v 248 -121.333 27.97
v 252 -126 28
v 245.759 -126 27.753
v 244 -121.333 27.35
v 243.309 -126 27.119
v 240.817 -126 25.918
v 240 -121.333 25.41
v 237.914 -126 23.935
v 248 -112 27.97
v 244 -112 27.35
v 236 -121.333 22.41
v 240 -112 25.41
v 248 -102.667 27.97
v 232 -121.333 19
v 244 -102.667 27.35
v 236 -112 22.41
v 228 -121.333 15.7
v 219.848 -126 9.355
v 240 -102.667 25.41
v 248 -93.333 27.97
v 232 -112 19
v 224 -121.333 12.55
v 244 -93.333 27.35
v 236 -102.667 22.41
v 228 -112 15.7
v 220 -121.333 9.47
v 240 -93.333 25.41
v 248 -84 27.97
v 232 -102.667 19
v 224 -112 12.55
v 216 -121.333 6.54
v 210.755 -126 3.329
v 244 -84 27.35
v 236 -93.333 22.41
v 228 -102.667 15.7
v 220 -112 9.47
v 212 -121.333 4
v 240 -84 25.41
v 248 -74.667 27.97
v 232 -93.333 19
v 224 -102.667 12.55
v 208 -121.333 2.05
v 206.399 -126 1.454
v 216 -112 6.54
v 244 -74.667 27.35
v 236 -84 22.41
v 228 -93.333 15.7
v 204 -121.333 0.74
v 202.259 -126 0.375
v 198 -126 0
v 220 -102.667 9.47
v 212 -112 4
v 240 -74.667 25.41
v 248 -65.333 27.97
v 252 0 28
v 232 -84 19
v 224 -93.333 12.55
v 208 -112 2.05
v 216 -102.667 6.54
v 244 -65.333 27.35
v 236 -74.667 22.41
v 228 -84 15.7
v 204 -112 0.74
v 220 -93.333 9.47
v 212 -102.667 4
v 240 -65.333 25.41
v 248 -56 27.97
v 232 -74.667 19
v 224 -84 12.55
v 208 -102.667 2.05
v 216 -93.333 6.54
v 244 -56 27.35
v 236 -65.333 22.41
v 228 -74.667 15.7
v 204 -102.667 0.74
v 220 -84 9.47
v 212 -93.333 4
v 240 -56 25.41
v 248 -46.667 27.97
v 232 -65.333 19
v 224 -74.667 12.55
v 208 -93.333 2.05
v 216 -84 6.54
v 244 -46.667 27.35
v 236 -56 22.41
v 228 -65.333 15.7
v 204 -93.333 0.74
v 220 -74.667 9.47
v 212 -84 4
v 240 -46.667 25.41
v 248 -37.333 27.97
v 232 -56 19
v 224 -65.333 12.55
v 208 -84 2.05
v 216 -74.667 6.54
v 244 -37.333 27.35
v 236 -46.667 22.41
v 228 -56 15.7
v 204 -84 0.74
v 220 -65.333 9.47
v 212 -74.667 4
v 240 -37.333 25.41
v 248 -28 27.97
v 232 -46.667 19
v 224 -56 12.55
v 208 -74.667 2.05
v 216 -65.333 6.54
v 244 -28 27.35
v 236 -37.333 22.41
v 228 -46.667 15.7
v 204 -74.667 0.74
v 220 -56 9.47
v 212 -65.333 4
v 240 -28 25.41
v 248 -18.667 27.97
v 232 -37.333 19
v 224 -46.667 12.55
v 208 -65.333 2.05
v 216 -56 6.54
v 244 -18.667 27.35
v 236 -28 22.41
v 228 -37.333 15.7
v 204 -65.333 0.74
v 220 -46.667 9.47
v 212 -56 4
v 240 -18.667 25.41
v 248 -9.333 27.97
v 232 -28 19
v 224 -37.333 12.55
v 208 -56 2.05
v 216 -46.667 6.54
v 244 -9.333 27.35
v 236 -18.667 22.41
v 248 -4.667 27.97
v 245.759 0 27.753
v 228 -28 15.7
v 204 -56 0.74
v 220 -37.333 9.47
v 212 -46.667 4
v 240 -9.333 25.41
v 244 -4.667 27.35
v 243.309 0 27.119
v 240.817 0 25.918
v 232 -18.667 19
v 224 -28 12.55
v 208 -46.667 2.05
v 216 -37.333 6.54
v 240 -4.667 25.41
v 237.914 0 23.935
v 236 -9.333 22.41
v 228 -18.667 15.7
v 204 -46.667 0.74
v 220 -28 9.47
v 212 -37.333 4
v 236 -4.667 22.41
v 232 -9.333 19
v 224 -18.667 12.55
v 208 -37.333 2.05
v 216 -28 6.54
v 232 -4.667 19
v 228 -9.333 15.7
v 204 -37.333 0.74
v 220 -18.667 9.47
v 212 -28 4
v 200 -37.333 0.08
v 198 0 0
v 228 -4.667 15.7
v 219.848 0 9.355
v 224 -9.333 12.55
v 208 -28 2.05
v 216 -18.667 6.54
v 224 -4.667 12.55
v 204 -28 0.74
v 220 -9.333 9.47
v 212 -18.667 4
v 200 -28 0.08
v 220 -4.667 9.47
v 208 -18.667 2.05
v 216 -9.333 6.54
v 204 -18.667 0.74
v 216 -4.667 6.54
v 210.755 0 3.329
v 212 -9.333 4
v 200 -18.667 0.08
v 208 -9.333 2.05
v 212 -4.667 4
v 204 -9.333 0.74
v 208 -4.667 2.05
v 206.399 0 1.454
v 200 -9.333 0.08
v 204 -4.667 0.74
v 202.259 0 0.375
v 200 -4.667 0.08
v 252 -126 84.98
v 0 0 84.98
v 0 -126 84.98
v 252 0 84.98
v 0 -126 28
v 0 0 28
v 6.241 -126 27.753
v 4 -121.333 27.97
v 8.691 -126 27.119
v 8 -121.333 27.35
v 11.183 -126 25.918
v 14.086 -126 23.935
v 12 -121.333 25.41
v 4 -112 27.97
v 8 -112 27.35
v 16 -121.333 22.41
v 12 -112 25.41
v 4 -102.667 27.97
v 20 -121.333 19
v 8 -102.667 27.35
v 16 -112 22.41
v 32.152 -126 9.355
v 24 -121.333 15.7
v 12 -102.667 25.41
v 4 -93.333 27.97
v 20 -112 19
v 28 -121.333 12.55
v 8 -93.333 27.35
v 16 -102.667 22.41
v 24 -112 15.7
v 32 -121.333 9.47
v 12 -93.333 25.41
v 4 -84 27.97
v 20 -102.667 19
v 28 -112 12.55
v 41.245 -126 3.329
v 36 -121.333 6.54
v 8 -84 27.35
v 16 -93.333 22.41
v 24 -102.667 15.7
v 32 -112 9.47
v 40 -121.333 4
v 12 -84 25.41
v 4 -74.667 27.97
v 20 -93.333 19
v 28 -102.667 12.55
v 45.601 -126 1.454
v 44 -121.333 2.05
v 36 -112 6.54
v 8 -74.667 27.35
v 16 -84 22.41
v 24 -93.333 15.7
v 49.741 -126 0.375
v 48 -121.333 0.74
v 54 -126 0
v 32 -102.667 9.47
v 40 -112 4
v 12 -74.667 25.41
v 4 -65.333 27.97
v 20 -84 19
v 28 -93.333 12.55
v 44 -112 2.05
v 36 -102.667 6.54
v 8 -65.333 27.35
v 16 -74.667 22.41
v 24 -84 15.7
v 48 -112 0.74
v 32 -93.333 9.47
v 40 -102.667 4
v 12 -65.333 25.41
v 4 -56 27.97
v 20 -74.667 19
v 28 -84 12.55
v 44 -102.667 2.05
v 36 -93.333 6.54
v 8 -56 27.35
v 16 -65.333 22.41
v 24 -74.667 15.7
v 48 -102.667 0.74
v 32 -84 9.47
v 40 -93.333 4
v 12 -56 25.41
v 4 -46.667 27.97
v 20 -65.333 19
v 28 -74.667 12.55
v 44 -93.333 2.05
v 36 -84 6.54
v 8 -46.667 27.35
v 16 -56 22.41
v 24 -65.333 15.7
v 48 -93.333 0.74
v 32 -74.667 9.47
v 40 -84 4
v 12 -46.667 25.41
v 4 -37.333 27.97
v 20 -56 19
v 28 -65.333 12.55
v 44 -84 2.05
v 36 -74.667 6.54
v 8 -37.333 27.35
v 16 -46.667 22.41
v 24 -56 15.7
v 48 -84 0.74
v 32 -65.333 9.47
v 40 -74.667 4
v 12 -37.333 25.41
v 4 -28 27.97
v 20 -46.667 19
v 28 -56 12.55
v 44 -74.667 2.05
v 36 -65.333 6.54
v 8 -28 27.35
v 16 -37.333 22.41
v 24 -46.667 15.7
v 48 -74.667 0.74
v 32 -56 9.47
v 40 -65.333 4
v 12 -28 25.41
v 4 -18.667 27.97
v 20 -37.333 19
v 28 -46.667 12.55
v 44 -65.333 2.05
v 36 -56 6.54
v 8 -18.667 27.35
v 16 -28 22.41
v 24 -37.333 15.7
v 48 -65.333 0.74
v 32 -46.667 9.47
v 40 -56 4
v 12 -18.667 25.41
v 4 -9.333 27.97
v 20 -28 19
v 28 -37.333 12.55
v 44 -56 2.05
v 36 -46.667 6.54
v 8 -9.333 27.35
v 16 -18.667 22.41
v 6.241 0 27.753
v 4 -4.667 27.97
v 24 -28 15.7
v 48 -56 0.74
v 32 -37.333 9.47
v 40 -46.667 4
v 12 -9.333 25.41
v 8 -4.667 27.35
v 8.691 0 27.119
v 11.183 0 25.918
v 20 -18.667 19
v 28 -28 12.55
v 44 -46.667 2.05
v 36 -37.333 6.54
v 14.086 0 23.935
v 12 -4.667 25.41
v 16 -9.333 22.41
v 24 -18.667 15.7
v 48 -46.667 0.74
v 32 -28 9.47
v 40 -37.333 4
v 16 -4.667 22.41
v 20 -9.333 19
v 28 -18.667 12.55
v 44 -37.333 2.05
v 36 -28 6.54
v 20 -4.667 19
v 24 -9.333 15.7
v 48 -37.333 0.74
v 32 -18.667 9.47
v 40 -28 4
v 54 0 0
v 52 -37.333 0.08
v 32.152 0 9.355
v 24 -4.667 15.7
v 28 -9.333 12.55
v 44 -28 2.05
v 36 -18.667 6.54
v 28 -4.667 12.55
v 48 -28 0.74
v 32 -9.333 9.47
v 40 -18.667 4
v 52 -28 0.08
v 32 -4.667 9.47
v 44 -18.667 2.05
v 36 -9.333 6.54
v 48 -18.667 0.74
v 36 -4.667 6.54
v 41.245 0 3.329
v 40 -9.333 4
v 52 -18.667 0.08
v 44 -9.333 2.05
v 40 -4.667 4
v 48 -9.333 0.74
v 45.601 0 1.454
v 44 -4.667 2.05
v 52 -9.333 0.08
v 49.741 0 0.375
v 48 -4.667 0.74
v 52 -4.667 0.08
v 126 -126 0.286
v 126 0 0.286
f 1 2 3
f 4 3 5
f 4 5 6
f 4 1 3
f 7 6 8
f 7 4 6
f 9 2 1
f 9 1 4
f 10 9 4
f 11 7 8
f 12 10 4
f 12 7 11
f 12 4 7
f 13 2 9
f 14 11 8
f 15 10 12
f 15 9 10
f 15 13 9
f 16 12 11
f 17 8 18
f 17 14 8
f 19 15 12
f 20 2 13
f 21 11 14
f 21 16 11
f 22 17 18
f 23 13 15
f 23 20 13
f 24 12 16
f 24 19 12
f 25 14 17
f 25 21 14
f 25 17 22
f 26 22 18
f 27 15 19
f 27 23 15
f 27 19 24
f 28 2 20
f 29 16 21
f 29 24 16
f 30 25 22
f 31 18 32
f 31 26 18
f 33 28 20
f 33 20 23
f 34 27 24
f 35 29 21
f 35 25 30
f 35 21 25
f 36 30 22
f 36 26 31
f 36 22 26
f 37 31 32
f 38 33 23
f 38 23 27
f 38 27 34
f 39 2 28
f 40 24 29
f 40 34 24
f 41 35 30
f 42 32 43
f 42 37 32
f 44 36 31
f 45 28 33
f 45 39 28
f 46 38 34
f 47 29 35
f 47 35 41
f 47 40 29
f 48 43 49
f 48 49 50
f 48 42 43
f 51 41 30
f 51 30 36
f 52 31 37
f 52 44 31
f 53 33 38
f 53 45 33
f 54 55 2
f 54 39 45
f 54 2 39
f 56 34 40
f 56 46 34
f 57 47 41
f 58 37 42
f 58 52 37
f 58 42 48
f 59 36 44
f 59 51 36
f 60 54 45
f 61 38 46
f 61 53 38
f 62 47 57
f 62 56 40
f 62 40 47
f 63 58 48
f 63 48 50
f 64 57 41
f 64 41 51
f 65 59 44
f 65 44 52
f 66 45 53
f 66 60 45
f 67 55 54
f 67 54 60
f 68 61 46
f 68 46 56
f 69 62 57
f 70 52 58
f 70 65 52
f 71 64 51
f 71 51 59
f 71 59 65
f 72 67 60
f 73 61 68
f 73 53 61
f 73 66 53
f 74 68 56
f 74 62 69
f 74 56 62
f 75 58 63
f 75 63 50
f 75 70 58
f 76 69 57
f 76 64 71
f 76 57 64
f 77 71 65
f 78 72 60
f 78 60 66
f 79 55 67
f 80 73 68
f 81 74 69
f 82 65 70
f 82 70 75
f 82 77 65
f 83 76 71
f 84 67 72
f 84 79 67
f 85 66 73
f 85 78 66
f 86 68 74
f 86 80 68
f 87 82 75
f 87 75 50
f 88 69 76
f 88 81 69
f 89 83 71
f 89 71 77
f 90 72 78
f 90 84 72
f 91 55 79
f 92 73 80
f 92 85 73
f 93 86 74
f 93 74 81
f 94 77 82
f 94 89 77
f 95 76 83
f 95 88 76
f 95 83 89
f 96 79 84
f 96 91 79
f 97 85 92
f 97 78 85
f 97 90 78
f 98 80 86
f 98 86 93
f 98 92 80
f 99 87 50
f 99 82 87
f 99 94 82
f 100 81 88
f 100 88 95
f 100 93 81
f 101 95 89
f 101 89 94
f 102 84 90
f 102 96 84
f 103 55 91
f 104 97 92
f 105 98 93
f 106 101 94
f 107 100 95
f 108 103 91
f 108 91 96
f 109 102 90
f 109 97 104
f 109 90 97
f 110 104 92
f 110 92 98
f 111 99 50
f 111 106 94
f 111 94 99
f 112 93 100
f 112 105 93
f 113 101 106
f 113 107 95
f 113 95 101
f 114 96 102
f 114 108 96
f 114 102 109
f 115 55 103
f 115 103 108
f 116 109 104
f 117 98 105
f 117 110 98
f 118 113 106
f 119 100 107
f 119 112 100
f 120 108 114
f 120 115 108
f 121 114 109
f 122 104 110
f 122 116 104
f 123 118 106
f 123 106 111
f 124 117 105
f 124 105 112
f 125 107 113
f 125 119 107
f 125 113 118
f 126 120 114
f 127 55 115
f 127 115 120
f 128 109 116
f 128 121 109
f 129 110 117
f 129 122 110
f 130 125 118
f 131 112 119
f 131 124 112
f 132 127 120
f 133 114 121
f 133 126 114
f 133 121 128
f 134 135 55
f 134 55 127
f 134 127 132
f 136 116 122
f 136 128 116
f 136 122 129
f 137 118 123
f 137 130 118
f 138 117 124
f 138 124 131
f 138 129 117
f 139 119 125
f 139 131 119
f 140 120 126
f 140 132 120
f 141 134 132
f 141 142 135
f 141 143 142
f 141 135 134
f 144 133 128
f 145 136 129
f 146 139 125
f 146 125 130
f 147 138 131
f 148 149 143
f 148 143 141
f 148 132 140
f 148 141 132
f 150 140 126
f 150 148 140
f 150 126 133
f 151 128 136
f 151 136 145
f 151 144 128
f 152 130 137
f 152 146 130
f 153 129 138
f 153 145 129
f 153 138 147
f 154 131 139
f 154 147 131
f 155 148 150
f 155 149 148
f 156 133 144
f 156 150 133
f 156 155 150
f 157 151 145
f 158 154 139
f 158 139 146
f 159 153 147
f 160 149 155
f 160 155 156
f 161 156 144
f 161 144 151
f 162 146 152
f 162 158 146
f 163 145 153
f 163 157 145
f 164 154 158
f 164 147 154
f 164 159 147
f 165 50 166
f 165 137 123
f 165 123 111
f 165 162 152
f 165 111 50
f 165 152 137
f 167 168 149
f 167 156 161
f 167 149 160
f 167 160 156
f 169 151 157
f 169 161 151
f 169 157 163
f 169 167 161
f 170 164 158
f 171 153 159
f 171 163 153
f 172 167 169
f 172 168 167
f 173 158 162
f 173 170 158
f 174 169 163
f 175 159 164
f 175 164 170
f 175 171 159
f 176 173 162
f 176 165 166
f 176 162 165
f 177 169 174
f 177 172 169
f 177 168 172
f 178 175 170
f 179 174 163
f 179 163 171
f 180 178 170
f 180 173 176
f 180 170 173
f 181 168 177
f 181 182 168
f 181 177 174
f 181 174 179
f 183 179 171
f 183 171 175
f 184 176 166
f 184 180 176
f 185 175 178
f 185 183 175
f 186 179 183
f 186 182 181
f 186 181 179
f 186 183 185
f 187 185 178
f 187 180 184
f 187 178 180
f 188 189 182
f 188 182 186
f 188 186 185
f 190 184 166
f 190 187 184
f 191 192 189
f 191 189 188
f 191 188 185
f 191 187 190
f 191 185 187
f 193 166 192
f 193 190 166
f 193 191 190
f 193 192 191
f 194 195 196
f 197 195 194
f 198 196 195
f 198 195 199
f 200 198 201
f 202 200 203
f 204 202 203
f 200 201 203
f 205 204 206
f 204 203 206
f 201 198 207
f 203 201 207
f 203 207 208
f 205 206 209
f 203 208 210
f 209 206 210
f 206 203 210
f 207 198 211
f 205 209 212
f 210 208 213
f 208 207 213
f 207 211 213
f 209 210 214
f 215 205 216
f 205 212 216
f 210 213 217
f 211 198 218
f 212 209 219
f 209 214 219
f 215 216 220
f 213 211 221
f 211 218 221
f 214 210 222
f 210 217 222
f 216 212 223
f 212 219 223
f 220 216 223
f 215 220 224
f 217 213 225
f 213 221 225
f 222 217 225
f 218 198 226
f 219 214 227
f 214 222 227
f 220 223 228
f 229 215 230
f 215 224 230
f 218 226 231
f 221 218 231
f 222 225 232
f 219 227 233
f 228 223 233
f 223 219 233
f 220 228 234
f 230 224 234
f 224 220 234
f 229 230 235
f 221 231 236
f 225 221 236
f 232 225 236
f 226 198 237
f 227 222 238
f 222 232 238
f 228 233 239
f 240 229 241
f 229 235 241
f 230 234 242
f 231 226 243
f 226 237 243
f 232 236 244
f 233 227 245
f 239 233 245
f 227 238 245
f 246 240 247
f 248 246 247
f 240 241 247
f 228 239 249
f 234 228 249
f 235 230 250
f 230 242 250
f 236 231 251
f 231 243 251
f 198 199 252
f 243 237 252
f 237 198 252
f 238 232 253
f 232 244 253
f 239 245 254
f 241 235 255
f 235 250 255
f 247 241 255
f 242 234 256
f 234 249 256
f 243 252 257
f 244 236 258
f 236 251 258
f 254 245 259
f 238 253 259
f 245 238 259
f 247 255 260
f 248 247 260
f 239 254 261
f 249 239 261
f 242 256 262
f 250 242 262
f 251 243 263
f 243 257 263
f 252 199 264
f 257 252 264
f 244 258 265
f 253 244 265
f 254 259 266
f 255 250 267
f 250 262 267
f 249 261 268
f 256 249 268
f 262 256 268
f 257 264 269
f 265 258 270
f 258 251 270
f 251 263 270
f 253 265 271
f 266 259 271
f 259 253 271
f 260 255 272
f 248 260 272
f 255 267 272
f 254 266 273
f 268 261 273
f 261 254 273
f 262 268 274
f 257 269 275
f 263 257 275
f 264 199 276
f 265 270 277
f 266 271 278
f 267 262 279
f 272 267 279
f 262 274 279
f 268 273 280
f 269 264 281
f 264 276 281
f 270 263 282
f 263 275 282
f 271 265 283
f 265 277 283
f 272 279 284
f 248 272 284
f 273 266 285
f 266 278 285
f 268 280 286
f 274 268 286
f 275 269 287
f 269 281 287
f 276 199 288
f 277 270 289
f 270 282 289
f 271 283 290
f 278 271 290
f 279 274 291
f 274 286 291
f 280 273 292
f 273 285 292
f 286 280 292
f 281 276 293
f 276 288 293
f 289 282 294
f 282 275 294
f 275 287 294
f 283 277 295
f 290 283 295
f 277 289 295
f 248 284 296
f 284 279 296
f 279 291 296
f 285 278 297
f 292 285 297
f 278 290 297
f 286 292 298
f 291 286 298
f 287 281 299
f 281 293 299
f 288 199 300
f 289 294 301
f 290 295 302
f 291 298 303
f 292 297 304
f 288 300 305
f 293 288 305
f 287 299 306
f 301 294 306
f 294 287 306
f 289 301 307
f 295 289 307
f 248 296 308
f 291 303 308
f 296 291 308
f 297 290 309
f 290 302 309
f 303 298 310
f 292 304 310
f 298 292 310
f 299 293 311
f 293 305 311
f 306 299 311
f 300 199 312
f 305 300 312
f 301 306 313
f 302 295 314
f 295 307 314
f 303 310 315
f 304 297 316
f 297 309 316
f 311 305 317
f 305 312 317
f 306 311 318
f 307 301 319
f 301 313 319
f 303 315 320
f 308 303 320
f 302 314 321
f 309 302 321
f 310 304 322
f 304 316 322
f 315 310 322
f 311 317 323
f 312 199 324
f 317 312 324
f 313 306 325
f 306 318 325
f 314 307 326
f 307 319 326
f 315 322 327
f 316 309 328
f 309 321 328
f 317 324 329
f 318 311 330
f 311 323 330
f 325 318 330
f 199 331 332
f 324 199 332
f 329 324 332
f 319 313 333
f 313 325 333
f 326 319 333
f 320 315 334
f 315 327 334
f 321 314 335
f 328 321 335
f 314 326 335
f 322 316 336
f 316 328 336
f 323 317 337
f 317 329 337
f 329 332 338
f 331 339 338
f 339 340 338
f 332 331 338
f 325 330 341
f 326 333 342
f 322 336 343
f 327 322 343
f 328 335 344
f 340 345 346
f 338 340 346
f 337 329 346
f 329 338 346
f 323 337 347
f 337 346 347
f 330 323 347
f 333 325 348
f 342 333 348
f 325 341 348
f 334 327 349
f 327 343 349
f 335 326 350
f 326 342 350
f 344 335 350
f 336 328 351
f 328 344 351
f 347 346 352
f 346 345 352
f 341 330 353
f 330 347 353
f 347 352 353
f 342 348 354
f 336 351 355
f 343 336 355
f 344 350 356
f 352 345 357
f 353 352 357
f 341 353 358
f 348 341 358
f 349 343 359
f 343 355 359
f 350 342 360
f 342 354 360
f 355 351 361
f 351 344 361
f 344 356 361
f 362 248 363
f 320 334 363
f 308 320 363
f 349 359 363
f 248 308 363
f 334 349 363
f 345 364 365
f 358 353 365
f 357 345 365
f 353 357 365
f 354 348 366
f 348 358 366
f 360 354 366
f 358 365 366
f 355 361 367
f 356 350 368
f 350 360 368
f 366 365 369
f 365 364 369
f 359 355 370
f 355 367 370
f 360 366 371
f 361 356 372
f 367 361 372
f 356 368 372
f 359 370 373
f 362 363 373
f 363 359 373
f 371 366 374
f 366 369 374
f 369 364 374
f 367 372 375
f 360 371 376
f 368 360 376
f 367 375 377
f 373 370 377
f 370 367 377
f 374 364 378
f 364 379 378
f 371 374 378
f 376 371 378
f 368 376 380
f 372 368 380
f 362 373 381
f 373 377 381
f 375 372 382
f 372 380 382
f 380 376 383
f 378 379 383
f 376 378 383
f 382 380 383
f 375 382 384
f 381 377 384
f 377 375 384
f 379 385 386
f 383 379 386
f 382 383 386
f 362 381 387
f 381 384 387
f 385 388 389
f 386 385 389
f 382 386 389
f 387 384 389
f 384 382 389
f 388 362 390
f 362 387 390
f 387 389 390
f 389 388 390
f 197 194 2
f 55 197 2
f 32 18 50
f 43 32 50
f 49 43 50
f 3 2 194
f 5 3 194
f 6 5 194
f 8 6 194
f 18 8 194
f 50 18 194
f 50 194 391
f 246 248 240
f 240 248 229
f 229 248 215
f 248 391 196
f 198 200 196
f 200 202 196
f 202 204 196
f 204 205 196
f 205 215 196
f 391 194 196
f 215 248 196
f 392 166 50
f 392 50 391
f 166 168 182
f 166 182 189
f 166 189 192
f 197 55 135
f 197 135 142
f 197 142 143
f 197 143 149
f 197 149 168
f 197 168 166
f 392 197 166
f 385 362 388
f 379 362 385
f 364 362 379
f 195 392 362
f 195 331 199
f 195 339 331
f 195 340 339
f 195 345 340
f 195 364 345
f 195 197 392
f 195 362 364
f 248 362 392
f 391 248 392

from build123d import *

# Parameters (mm, degrees)
F1_DEPTH = 126


with BuildPart() as f1:
    # F0 (on Front) → F1 (new body)
    with BuildSketch(Plane.XZ):
        with BuildLine():
            Line((0, 84.98), (0, 28))
            add(Edge.make_bspline(
                [(0, 28), (0.618794, 28.000273), (2.022182, 28.000889), (3.997252, 27.996472), (6.020393, 27.83137), (8.049271, 27.39716), (10.073322, 26.588185), (12.058052, 25.412291), (14.042848, 23.996858), (16.027734, 22.406702), (18.001384, 20.708277), (19.989334, 19.000738), (21.990425, 17.331716), (23.990056, 15.700986), (25.99234, 14.110248), (27.99837, 12.551237), (29.994775, 10.999885), (31.99357, 9.471529), (33.983048, 7.970339), (35.976312, 6.539007), (37.973681, 5.208922), (39.964333, 3.990272), (41.971527, 2.941765), (43.969055, 2.030999), (45.979124, 1.30507), (47.97783, 0.713784), (49.993541, 0.308832), (51.97042, 0.044173), (53.38056, 0.013435), (54, 0)],
                knots=[0, 0, 0, 0, 2, 4.000225, 6.008309, 8.056137, 10.206509, 12.513563, 14.960623, 17.515637, 20.140518, 22.771887, 25.377439, 27.957535, 30.51255, 33.049004, 35.579321, 38.097435, 40.597435, 43.056073, 45.457926, 47.795468, 50.054339, 52.24751, 54.376571, 56.458974, 58.500566, 60.51613, 62.51773, 62.51773, 62.51773, 62.51773], degree=3))
            Line((54, 0), (126, 0.28596))
            Line((126, 0.28596), (126, 84.98))
            Line((126, 84.98), (0, 84.98))
        make_face()
    extrude(amount=F1_DEPTH)

    # F2: F1 across face


with BuildPart() as f1_1:
    add(f1.part)
    add(f1.part.mirror(Plane(origin=(126, -63, 42.63298), x_dir=(0, 1, 0), z_dir=(1, 0, 0))))


solid = f1_1.part
